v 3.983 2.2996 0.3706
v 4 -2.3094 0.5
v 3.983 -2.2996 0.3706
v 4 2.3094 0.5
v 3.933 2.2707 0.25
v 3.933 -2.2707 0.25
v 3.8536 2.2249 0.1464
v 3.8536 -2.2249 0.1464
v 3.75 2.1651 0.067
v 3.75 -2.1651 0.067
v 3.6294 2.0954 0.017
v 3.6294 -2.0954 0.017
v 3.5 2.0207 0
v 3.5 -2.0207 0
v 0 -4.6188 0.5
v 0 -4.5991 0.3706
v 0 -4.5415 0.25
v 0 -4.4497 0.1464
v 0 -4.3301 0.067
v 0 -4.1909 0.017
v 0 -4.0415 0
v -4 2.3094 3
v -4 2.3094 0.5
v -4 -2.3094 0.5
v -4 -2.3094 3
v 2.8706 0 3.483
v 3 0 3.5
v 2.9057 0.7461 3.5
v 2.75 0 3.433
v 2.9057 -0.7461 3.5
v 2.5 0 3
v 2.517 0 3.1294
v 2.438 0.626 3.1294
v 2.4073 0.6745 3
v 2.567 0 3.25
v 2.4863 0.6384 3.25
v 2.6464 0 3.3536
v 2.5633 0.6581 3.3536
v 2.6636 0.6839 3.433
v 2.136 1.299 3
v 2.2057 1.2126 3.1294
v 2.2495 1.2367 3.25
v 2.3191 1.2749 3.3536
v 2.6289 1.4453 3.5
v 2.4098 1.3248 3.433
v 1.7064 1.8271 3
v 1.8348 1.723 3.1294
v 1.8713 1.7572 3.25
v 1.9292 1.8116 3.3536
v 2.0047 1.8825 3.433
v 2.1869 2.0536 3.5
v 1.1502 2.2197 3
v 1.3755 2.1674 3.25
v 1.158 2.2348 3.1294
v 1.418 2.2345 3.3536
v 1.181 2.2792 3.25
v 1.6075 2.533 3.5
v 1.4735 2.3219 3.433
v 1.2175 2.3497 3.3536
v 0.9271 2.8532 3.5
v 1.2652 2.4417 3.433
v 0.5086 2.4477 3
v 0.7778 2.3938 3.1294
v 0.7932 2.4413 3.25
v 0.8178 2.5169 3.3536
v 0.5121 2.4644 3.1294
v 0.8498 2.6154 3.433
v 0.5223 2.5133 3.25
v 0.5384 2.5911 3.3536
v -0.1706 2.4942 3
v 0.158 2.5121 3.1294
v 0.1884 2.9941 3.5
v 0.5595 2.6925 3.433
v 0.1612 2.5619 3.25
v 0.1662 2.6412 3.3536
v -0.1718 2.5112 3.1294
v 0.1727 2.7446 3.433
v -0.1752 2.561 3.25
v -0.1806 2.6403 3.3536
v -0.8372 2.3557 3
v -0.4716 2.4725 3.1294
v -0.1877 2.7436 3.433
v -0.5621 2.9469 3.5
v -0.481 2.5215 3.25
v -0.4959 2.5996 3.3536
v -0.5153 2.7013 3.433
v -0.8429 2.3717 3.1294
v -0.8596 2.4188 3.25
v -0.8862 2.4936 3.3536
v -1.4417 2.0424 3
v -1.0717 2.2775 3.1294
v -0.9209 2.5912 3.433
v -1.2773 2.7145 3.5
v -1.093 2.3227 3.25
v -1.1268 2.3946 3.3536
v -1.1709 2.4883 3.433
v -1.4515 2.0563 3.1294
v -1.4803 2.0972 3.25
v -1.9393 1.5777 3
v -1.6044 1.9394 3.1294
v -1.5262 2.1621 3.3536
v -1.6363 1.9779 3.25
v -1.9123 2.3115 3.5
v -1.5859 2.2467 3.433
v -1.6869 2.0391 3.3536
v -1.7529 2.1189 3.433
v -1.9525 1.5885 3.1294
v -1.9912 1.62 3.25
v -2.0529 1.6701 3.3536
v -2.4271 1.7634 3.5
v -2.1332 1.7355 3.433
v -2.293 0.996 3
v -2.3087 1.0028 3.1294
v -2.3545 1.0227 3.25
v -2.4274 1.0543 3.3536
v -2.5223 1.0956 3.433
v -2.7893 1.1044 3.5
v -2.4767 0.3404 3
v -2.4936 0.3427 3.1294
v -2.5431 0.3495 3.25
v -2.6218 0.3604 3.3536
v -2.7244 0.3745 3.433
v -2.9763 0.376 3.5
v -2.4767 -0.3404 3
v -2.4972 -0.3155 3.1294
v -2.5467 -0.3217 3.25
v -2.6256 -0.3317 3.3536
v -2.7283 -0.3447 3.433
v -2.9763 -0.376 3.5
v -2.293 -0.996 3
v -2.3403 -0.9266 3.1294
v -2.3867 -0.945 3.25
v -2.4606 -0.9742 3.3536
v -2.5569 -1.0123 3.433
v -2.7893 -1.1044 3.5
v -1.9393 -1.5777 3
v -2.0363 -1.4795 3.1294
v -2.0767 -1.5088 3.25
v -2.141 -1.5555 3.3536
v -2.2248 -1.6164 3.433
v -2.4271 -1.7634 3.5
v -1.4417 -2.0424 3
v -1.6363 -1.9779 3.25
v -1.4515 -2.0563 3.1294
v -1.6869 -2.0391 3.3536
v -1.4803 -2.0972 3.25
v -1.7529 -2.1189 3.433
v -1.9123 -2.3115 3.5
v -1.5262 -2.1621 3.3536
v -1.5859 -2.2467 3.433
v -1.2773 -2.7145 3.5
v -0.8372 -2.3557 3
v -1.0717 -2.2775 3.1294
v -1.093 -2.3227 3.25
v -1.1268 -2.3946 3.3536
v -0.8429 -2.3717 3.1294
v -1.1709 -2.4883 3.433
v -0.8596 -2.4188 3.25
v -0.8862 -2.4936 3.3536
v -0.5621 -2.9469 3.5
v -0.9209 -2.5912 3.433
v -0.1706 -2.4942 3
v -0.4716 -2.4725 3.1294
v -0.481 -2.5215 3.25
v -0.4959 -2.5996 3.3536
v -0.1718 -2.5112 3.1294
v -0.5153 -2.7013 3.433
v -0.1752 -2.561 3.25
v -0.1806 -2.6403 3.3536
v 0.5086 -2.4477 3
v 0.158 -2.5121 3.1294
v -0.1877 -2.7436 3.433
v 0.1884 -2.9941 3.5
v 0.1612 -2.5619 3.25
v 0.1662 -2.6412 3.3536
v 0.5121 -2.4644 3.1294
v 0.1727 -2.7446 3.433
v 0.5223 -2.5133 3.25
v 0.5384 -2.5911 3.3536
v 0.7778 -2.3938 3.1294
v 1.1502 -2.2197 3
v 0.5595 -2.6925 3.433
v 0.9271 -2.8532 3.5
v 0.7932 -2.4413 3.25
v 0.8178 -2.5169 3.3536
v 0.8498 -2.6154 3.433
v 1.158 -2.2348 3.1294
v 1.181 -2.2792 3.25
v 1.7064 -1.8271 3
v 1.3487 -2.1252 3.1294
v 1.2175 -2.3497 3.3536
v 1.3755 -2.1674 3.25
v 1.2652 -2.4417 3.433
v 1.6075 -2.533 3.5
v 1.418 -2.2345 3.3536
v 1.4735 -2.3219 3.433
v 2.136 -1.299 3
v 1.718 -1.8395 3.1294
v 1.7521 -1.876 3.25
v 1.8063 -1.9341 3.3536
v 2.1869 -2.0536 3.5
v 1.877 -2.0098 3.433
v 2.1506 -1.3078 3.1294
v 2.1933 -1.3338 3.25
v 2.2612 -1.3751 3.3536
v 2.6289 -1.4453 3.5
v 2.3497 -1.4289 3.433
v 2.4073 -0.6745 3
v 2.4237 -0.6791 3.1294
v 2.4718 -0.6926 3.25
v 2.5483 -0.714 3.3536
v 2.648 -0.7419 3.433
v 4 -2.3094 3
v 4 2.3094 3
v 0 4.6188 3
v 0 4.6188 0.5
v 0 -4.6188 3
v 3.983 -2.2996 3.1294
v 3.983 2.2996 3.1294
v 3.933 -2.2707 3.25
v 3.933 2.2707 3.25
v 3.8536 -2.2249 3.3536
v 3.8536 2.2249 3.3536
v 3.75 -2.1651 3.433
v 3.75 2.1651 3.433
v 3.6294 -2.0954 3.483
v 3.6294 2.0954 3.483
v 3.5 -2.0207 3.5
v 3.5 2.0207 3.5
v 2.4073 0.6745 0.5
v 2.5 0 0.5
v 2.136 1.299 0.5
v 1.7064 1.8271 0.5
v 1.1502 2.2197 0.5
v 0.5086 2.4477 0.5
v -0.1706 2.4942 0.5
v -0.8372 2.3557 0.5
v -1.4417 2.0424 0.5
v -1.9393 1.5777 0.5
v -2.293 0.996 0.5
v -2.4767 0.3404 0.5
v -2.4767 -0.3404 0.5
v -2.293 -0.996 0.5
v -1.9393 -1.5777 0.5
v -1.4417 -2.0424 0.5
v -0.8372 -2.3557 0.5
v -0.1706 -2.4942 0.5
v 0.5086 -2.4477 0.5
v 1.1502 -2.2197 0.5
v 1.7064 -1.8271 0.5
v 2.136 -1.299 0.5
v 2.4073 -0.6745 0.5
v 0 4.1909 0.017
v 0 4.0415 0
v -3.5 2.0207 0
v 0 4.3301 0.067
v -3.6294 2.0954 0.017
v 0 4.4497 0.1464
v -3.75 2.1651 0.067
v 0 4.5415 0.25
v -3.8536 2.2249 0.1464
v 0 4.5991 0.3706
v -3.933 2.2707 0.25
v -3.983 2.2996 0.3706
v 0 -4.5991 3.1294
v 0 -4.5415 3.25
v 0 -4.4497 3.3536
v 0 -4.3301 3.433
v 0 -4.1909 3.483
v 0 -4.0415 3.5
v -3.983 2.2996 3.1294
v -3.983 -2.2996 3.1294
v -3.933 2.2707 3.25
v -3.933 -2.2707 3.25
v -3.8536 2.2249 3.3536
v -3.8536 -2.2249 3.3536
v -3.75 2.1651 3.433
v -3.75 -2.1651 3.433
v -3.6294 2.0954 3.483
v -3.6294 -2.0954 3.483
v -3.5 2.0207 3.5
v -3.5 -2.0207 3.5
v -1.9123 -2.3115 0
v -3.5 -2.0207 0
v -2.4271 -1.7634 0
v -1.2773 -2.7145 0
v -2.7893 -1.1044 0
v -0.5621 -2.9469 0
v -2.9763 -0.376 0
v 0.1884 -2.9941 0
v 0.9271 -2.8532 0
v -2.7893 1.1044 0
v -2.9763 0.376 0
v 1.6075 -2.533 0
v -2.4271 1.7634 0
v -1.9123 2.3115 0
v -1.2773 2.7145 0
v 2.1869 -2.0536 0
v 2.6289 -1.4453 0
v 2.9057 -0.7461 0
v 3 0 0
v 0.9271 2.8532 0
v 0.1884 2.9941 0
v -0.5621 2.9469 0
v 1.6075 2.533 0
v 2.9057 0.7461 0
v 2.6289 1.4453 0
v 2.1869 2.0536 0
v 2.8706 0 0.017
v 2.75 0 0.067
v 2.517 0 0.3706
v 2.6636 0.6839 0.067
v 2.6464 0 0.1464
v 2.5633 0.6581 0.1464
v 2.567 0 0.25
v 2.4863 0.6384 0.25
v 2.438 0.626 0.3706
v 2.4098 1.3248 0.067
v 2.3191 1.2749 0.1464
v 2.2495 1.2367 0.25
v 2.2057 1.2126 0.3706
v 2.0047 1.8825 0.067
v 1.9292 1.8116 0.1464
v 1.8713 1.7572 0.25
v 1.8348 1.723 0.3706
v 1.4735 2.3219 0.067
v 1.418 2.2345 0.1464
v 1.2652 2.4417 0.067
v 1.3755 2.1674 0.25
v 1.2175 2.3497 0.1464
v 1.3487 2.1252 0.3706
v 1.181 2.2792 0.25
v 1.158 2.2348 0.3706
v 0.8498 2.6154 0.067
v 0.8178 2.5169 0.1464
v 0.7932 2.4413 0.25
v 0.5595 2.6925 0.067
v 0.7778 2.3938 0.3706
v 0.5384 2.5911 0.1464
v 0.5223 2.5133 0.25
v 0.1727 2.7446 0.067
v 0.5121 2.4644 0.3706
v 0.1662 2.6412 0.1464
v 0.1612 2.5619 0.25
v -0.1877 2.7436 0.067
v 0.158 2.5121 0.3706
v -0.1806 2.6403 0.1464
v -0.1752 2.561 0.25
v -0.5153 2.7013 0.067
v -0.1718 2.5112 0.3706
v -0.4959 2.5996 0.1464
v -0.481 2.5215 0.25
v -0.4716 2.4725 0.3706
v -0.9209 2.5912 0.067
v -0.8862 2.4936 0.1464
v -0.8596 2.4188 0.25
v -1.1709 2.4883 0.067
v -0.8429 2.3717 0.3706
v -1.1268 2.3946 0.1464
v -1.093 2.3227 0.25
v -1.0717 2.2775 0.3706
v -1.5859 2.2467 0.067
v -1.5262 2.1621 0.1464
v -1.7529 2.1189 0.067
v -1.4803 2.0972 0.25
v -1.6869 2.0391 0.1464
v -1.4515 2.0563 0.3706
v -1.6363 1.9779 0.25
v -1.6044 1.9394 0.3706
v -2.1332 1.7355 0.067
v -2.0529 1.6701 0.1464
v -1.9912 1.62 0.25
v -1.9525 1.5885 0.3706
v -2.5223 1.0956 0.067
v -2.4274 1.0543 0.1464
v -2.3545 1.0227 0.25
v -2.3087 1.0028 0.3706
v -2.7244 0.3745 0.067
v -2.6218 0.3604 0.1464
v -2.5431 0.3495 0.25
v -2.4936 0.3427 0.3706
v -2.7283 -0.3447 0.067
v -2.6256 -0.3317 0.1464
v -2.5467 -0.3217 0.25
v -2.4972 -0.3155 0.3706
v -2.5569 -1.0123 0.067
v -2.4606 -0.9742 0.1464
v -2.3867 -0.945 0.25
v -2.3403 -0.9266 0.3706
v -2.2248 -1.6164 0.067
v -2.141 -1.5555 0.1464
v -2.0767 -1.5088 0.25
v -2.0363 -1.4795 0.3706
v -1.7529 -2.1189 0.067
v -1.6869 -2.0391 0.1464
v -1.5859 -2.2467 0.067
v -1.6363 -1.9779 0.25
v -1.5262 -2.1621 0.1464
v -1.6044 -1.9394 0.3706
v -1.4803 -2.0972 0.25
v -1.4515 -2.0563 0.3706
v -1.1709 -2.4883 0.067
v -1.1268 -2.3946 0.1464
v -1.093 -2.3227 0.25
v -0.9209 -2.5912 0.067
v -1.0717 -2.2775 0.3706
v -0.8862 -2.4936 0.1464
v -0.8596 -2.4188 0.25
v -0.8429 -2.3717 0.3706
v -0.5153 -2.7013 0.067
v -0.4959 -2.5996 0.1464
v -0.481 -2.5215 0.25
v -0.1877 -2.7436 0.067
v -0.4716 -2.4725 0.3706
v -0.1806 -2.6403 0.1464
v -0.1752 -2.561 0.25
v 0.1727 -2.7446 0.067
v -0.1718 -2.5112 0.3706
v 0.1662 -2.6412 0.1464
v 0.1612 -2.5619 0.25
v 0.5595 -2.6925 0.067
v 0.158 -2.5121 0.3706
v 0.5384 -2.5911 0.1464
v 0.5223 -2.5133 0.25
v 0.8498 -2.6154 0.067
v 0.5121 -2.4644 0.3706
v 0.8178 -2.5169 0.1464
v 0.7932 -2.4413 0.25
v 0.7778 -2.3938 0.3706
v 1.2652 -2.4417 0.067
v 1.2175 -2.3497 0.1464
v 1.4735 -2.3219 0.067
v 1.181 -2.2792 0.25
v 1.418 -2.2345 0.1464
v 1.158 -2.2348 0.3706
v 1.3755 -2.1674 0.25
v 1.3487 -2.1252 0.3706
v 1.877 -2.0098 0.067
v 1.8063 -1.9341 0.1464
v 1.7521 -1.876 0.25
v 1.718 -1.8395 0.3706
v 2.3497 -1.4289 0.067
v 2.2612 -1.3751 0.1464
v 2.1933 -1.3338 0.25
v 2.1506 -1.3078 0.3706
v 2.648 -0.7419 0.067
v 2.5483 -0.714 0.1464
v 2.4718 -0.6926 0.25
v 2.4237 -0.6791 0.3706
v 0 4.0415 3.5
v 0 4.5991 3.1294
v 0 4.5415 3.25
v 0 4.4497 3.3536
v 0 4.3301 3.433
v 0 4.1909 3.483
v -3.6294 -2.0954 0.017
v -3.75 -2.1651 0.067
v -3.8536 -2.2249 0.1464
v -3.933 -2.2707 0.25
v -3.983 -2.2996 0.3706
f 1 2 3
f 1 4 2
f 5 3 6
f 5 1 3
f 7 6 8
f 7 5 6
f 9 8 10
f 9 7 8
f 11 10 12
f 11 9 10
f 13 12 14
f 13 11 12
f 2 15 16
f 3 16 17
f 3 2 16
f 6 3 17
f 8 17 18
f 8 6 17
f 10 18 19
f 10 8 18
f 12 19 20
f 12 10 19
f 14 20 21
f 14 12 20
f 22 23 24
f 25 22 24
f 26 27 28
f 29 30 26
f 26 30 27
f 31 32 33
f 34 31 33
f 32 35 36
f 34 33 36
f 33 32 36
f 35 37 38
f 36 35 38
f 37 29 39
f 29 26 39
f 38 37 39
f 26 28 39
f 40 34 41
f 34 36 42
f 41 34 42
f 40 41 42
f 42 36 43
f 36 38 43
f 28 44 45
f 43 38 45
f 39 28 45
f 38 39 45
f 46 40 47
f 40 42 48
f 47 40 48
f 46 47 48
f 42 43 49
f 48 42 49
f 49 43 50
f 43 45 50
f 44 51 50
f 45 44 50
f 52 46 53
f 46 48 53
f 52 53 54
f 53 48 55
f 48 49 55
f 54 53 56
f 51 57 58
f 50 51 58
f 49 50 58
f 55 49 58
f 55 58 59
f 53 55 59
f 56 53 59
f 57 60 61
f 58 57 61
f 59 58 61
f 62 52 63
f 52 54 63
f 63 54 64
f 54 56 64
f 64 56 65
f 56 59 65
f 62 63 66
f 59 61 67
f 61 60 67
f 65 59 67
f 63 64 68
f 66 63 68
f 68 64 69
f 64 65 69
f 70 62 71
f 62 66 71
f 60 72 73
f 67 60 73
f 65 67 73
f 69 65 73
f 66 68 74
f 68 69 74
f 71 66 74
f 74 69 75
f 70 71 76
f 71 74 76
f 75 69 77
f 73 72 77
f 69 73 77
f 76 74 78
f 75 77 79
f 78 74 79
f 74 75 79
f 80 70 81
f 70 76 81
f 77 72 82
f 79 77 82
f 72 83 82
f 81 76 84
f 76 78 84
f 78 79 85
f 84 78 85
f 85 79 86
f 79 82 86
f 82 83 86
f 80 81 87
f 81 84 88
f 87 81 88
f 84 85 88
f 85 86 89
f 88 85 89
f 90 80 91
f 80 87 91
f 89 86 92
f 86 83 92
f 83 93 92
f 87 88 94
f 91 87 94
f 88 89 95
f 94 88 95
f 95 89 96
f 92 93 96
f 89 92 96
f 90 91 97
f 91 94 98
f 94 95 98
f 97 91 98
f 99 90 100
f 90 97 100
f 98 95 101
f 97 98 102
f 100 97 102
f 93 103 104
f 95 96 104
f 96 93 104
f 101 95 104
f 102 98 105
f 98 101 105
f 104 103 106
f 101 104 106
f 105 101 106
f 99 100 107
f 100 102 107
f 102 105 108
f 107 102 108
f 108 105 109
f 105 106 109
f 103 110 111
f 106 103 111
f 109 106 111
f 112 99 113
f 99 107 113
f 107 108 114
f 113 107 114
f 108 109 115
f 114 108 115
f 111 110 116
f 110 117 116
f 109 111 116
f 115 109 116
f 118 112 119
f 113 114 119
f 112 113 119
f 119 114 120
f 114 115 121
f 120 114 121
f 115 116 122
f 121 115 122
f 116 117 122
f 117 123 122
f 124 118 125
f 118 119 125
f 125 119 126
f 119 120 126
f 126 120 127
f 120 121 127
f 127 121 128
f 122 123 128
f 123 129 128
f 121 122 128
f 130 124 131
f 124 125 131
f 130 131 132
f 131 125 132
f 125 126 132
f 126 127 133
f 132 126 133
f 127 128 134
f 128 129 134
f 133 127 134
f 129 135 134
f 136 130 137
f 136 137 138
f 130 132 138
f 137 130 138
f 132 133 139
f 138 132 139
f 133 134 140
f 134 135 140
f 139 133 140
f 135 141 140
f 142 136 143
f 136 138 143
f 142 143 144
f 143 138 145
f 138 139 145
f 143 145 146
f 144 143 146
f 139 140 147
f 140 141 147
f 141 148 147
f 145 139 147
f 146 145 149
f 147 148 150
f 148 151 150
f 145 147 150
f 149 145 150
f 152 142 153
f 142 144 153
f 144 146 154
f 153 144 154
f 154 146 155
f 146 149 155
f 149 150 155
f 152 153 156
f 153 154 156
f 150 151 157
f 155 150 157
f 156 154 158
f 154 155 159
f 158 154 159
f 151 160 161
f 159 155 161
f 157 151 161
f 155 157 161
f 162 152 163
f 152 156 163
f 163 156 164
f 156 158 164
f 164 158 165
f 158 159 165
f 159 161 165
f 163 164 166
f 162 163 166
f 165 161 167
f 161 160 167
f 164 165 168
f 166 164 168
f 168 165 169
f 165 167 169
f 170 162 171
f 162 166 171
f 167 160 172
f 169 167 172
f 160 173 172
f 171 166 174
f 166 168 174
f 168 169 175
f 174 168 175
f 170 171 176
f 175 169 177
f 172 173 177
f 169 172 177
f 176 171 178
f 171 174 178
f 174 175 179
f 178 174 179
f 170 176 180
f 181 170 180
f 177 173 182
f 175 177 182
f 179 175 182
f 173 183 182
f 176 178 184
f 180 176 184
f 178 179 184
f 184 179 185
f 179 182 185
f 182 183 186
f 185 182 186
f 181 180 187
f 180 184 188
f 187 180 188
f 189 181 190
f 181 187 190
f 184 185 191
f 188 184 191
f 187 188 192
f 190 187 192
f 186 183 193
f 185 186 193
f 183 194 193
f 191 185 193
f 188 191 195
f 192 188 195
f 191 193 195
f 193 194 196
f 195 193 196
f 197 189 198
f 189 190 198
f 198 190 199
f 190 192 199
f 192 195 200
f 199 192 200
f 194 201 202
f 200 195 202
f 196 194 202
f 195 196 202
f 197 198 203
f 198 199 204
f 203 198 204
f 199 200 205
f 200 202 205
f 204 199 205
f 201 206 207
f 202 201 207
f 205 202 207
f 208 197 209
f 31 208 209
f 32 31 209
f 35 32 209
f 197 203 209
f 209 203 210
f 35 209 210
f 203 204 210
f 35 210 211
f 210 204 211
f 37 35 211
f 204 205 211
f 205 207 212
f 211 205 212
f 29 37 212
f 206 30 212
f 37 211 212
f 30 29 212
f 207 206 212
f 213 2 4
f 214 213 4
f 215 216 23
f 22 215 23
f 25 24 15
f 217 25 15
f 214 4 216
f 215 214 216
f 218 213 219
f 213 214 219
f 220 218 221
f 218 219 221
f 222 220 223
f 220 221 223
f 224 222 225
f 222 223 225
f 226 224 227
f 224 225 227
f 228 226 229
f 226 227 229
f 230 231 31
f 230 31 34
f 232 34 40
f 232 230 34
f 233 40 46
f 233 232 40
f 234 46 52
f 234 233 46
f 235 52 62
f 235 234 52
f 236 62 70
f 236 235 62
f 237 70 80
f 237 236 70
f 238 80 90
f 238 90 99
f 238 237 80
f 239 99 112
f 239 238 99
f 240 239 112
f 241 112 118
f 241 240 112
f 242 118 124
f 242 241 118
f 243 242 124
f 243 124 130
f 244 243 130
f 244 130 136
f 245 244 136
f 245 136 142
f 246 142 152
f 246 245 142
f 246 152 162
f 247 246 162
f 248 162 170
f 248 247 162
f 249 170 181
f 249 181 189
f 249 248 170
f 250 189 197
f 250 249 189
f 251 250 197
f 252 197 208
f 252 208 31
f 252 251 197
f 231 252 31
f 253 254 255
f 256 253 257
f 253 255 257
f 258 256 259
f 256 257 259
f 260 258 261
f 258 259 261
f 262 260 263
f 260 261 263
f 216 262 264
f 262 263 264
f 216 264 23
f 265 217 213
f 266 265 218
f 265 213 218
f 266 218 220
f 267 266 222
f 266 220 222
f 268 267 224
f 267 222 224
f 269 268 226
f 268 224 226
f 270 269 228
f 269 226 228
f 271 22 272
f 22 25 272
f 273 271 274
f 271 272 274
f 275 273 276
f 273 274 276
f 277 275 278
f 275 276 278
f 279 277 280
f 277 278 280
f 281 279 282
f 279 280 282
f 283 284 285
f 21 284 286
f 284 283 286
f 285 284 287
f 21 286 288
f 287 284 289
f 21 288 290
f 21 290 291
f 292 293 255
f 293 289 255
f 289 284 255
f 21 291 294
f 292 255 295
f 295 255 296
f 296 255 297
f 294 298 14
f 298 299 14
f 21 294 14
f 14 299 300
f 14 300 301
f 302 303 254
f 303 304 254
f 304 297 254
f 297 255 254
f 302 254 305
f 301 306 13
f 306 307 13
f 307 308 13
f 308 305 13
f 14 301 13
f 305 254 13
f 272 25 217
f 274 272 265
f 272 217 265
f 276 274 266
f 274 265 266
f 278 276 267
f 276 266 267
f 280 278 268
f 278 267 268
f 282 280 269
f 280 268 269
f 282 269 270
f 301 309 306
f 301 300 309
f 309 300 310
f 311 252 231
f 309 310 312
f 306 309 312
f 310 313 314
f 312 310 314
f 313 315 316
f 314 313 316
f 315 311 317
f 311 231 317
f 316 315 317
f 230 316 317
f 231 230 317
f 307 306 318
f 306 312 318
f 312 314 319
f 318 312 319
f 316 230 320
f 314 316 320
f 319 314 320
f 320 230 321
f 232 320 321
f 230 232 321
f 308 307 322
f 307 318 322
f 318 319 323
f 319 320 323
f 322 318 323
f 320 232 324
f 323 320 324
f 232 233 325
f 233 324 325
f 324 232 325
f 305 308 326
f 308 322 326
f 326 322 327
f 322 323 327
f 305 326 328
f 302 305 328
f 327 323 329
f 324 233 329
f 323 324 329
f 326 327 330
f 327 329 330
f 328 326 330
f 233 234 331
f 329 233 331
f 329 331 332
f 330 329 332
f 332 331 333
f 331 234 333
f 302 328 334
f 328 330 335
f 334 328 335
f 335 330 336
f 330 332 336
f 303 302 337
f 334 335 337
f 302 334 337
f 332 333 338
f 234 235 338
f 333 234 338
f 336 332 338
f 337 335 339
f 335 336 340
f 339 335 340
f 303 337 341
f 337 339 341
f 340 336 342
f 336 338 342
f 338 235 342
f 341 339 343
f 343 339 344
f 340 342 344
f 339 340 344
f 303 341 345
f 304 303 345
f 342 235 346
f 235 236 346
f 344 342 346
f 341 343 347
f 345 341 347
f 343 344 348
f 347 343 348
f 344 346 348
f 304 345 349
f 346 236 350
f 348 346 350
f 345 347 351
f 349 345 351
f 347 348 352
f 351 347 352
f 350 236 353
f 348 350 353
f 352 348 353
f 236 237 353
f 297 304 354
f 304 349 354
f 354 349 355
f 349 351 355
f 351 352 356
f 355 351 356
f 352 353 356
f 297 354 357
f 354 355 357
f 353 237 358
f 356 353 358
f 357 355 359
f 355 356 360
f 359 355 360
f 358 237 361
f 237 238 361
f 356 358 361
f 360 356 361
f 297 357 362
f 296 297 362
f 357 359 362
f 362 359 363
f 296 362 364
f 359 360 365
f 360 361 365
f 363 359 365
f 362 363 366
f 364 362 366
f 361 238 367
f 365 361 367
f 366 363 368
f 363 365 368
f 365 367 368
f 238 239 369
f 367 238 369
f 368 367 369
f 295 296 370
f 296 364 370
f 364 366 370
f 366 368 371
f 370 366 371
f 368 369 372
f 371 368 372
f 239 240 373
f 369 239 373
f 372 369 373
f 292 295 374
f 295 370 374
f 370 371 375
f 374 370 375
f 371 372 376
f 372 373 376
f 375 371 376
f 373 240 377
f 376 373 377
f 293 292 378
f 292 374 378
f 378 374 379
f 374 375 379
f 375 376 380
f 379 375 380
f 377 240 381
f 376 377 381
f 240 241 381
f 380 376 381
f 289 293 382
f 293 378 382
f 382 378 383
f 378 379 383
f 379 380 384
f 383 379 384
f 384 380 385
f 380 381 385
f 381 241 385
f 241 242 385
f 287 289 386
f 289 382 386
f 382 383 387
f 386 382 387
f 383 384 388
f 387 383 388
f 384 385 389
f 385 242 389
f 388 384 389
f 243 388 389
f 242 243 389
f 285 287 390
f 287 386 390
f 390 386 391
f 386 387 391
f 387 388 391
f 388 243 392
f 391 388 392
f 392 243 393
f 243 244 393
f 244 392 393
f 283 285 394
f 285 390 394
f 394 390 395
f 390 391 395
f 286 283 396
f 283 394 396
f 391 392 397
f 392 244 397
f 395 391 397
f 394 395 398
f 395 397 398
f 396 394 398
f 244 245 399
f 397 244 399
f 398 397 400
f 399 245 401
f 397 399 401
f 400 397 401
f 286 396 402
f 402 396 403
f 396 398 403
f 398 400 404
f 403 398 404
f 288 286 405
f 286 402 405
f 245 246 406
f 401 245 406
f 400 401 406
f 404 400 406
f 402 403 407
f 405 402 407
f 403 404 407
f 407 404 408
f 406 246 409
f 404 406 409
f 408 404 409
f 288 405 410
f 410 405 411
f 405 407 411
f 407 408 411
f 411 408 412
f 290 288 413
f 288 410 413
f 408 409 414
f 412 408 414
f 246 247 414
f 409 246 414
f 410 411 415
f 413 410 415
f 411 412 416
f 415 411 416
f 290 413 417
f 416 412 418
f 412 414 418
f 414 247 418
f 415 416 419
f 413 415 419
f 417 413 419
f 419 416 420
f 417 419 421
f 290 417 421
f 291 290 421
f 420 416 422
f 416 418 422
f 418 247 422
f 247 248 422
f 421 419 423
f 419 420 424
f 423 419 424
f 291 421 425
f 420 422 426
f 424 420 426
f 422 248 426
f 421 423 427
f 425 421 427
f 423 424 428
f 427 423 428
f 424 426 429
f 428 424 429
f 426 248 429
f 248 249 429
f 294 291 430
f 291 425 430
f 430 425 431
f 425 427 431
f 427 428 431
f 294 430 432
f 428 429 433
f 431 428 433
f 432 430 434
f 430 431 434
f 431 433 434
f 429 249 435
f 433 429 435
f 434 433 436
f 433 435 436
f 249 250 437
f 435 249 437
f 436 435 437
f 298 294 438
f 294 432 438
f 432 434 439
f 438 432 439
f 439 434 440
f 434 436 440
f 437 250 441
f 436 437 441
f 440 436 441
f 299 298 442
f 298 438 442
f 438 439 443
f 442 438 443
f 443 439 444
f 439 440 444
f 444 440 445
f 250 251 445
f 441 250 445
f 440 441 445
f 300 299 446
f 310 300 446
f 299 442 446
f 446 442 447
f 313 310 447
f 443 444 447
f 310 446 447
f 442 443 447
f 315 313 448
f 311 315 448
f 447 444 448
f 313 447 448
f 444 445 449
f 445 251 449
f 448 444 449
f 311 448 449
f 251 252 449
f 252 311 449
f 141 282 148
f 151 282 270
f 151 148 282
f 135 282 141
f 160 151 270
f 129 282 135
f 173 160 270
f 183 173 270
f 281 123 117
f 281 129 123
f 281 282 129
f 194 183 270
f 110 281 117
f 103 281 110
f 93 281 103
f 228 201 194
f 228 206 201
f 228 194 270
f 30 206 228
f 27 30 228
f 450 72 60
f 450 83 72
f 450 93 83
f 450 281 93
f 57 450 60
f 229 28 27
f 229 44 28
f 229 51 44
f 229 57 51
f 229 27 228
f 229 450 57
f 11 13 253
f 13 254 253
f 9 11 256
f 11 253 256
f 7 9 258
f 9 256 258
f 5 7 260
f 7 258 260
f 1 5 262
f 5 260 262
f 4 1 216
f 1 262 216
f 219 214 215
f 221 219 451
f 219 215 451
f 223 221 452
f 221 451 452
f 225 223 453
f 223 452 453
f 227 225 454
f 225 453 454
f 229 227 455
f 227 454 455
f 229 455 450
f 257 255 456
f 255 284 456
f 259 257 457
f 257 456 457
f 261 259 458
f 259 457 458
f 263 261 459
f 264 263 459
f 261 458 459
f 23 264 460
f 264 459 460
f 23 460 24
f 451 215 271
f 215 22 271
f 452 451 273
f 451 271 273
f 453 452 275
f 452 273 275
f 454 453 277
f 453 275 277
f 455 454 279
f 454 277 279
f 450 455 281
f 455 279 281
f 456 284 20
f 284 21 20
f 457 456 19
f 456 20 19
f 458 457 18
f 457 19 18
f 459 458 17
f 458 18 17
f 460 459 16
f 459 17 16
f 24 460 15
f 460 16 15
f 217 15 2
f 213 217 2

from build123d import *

# Parameters (mm, degrees)
F0_R     = 2.5
F1_DEPTH = 3.5
F2_R     = 0.5
F3_R     = 0.5


with BuildPart() as f1:
    # F0 (on Top) → F1 (new body)
    with BuildSketch(Plane.XY):
        Polygon((4, -2.309401), (4, 2.309401), (0, 4.618802), (-4, 2.309401), (-4, -2.309401), (0, -4.618802), align=None)
        Circle(F0_R, mode=Mode.SUBTRACT)
    extrude(amount=F1_DEPTH)

    # F2
    f2_edges = [f1.edges().sort_by_distance(p)[0] for p in [
        (4, 0, 3.5),
        (2, 3.464102, 3.5),
        (-2, 3.464102, 3.5),
        (-4, 0, 3.5),
        (-2, -3.464102, 3.5),
        (2, -3.464102, 3.5),
        (-2.5, 0, 3.5),
    ]]
    fillet(f2_edges, radius=F2_R)

    # F3
    f3_edges = [f1.edges().sort_by_distance(p)[0] for p in [
        (4, 0, 0),
        (2, 3.464102, 0),
        (-2, 3.464102, 0),
        (-4, 0, 0),
        (-2, -3.464102, 0),
        (2, -3.464102, 0),
        (-2.5, 0, 0),
    ]]
    fillet(f3_edges, radius=F3_R)


solid = f1.part
